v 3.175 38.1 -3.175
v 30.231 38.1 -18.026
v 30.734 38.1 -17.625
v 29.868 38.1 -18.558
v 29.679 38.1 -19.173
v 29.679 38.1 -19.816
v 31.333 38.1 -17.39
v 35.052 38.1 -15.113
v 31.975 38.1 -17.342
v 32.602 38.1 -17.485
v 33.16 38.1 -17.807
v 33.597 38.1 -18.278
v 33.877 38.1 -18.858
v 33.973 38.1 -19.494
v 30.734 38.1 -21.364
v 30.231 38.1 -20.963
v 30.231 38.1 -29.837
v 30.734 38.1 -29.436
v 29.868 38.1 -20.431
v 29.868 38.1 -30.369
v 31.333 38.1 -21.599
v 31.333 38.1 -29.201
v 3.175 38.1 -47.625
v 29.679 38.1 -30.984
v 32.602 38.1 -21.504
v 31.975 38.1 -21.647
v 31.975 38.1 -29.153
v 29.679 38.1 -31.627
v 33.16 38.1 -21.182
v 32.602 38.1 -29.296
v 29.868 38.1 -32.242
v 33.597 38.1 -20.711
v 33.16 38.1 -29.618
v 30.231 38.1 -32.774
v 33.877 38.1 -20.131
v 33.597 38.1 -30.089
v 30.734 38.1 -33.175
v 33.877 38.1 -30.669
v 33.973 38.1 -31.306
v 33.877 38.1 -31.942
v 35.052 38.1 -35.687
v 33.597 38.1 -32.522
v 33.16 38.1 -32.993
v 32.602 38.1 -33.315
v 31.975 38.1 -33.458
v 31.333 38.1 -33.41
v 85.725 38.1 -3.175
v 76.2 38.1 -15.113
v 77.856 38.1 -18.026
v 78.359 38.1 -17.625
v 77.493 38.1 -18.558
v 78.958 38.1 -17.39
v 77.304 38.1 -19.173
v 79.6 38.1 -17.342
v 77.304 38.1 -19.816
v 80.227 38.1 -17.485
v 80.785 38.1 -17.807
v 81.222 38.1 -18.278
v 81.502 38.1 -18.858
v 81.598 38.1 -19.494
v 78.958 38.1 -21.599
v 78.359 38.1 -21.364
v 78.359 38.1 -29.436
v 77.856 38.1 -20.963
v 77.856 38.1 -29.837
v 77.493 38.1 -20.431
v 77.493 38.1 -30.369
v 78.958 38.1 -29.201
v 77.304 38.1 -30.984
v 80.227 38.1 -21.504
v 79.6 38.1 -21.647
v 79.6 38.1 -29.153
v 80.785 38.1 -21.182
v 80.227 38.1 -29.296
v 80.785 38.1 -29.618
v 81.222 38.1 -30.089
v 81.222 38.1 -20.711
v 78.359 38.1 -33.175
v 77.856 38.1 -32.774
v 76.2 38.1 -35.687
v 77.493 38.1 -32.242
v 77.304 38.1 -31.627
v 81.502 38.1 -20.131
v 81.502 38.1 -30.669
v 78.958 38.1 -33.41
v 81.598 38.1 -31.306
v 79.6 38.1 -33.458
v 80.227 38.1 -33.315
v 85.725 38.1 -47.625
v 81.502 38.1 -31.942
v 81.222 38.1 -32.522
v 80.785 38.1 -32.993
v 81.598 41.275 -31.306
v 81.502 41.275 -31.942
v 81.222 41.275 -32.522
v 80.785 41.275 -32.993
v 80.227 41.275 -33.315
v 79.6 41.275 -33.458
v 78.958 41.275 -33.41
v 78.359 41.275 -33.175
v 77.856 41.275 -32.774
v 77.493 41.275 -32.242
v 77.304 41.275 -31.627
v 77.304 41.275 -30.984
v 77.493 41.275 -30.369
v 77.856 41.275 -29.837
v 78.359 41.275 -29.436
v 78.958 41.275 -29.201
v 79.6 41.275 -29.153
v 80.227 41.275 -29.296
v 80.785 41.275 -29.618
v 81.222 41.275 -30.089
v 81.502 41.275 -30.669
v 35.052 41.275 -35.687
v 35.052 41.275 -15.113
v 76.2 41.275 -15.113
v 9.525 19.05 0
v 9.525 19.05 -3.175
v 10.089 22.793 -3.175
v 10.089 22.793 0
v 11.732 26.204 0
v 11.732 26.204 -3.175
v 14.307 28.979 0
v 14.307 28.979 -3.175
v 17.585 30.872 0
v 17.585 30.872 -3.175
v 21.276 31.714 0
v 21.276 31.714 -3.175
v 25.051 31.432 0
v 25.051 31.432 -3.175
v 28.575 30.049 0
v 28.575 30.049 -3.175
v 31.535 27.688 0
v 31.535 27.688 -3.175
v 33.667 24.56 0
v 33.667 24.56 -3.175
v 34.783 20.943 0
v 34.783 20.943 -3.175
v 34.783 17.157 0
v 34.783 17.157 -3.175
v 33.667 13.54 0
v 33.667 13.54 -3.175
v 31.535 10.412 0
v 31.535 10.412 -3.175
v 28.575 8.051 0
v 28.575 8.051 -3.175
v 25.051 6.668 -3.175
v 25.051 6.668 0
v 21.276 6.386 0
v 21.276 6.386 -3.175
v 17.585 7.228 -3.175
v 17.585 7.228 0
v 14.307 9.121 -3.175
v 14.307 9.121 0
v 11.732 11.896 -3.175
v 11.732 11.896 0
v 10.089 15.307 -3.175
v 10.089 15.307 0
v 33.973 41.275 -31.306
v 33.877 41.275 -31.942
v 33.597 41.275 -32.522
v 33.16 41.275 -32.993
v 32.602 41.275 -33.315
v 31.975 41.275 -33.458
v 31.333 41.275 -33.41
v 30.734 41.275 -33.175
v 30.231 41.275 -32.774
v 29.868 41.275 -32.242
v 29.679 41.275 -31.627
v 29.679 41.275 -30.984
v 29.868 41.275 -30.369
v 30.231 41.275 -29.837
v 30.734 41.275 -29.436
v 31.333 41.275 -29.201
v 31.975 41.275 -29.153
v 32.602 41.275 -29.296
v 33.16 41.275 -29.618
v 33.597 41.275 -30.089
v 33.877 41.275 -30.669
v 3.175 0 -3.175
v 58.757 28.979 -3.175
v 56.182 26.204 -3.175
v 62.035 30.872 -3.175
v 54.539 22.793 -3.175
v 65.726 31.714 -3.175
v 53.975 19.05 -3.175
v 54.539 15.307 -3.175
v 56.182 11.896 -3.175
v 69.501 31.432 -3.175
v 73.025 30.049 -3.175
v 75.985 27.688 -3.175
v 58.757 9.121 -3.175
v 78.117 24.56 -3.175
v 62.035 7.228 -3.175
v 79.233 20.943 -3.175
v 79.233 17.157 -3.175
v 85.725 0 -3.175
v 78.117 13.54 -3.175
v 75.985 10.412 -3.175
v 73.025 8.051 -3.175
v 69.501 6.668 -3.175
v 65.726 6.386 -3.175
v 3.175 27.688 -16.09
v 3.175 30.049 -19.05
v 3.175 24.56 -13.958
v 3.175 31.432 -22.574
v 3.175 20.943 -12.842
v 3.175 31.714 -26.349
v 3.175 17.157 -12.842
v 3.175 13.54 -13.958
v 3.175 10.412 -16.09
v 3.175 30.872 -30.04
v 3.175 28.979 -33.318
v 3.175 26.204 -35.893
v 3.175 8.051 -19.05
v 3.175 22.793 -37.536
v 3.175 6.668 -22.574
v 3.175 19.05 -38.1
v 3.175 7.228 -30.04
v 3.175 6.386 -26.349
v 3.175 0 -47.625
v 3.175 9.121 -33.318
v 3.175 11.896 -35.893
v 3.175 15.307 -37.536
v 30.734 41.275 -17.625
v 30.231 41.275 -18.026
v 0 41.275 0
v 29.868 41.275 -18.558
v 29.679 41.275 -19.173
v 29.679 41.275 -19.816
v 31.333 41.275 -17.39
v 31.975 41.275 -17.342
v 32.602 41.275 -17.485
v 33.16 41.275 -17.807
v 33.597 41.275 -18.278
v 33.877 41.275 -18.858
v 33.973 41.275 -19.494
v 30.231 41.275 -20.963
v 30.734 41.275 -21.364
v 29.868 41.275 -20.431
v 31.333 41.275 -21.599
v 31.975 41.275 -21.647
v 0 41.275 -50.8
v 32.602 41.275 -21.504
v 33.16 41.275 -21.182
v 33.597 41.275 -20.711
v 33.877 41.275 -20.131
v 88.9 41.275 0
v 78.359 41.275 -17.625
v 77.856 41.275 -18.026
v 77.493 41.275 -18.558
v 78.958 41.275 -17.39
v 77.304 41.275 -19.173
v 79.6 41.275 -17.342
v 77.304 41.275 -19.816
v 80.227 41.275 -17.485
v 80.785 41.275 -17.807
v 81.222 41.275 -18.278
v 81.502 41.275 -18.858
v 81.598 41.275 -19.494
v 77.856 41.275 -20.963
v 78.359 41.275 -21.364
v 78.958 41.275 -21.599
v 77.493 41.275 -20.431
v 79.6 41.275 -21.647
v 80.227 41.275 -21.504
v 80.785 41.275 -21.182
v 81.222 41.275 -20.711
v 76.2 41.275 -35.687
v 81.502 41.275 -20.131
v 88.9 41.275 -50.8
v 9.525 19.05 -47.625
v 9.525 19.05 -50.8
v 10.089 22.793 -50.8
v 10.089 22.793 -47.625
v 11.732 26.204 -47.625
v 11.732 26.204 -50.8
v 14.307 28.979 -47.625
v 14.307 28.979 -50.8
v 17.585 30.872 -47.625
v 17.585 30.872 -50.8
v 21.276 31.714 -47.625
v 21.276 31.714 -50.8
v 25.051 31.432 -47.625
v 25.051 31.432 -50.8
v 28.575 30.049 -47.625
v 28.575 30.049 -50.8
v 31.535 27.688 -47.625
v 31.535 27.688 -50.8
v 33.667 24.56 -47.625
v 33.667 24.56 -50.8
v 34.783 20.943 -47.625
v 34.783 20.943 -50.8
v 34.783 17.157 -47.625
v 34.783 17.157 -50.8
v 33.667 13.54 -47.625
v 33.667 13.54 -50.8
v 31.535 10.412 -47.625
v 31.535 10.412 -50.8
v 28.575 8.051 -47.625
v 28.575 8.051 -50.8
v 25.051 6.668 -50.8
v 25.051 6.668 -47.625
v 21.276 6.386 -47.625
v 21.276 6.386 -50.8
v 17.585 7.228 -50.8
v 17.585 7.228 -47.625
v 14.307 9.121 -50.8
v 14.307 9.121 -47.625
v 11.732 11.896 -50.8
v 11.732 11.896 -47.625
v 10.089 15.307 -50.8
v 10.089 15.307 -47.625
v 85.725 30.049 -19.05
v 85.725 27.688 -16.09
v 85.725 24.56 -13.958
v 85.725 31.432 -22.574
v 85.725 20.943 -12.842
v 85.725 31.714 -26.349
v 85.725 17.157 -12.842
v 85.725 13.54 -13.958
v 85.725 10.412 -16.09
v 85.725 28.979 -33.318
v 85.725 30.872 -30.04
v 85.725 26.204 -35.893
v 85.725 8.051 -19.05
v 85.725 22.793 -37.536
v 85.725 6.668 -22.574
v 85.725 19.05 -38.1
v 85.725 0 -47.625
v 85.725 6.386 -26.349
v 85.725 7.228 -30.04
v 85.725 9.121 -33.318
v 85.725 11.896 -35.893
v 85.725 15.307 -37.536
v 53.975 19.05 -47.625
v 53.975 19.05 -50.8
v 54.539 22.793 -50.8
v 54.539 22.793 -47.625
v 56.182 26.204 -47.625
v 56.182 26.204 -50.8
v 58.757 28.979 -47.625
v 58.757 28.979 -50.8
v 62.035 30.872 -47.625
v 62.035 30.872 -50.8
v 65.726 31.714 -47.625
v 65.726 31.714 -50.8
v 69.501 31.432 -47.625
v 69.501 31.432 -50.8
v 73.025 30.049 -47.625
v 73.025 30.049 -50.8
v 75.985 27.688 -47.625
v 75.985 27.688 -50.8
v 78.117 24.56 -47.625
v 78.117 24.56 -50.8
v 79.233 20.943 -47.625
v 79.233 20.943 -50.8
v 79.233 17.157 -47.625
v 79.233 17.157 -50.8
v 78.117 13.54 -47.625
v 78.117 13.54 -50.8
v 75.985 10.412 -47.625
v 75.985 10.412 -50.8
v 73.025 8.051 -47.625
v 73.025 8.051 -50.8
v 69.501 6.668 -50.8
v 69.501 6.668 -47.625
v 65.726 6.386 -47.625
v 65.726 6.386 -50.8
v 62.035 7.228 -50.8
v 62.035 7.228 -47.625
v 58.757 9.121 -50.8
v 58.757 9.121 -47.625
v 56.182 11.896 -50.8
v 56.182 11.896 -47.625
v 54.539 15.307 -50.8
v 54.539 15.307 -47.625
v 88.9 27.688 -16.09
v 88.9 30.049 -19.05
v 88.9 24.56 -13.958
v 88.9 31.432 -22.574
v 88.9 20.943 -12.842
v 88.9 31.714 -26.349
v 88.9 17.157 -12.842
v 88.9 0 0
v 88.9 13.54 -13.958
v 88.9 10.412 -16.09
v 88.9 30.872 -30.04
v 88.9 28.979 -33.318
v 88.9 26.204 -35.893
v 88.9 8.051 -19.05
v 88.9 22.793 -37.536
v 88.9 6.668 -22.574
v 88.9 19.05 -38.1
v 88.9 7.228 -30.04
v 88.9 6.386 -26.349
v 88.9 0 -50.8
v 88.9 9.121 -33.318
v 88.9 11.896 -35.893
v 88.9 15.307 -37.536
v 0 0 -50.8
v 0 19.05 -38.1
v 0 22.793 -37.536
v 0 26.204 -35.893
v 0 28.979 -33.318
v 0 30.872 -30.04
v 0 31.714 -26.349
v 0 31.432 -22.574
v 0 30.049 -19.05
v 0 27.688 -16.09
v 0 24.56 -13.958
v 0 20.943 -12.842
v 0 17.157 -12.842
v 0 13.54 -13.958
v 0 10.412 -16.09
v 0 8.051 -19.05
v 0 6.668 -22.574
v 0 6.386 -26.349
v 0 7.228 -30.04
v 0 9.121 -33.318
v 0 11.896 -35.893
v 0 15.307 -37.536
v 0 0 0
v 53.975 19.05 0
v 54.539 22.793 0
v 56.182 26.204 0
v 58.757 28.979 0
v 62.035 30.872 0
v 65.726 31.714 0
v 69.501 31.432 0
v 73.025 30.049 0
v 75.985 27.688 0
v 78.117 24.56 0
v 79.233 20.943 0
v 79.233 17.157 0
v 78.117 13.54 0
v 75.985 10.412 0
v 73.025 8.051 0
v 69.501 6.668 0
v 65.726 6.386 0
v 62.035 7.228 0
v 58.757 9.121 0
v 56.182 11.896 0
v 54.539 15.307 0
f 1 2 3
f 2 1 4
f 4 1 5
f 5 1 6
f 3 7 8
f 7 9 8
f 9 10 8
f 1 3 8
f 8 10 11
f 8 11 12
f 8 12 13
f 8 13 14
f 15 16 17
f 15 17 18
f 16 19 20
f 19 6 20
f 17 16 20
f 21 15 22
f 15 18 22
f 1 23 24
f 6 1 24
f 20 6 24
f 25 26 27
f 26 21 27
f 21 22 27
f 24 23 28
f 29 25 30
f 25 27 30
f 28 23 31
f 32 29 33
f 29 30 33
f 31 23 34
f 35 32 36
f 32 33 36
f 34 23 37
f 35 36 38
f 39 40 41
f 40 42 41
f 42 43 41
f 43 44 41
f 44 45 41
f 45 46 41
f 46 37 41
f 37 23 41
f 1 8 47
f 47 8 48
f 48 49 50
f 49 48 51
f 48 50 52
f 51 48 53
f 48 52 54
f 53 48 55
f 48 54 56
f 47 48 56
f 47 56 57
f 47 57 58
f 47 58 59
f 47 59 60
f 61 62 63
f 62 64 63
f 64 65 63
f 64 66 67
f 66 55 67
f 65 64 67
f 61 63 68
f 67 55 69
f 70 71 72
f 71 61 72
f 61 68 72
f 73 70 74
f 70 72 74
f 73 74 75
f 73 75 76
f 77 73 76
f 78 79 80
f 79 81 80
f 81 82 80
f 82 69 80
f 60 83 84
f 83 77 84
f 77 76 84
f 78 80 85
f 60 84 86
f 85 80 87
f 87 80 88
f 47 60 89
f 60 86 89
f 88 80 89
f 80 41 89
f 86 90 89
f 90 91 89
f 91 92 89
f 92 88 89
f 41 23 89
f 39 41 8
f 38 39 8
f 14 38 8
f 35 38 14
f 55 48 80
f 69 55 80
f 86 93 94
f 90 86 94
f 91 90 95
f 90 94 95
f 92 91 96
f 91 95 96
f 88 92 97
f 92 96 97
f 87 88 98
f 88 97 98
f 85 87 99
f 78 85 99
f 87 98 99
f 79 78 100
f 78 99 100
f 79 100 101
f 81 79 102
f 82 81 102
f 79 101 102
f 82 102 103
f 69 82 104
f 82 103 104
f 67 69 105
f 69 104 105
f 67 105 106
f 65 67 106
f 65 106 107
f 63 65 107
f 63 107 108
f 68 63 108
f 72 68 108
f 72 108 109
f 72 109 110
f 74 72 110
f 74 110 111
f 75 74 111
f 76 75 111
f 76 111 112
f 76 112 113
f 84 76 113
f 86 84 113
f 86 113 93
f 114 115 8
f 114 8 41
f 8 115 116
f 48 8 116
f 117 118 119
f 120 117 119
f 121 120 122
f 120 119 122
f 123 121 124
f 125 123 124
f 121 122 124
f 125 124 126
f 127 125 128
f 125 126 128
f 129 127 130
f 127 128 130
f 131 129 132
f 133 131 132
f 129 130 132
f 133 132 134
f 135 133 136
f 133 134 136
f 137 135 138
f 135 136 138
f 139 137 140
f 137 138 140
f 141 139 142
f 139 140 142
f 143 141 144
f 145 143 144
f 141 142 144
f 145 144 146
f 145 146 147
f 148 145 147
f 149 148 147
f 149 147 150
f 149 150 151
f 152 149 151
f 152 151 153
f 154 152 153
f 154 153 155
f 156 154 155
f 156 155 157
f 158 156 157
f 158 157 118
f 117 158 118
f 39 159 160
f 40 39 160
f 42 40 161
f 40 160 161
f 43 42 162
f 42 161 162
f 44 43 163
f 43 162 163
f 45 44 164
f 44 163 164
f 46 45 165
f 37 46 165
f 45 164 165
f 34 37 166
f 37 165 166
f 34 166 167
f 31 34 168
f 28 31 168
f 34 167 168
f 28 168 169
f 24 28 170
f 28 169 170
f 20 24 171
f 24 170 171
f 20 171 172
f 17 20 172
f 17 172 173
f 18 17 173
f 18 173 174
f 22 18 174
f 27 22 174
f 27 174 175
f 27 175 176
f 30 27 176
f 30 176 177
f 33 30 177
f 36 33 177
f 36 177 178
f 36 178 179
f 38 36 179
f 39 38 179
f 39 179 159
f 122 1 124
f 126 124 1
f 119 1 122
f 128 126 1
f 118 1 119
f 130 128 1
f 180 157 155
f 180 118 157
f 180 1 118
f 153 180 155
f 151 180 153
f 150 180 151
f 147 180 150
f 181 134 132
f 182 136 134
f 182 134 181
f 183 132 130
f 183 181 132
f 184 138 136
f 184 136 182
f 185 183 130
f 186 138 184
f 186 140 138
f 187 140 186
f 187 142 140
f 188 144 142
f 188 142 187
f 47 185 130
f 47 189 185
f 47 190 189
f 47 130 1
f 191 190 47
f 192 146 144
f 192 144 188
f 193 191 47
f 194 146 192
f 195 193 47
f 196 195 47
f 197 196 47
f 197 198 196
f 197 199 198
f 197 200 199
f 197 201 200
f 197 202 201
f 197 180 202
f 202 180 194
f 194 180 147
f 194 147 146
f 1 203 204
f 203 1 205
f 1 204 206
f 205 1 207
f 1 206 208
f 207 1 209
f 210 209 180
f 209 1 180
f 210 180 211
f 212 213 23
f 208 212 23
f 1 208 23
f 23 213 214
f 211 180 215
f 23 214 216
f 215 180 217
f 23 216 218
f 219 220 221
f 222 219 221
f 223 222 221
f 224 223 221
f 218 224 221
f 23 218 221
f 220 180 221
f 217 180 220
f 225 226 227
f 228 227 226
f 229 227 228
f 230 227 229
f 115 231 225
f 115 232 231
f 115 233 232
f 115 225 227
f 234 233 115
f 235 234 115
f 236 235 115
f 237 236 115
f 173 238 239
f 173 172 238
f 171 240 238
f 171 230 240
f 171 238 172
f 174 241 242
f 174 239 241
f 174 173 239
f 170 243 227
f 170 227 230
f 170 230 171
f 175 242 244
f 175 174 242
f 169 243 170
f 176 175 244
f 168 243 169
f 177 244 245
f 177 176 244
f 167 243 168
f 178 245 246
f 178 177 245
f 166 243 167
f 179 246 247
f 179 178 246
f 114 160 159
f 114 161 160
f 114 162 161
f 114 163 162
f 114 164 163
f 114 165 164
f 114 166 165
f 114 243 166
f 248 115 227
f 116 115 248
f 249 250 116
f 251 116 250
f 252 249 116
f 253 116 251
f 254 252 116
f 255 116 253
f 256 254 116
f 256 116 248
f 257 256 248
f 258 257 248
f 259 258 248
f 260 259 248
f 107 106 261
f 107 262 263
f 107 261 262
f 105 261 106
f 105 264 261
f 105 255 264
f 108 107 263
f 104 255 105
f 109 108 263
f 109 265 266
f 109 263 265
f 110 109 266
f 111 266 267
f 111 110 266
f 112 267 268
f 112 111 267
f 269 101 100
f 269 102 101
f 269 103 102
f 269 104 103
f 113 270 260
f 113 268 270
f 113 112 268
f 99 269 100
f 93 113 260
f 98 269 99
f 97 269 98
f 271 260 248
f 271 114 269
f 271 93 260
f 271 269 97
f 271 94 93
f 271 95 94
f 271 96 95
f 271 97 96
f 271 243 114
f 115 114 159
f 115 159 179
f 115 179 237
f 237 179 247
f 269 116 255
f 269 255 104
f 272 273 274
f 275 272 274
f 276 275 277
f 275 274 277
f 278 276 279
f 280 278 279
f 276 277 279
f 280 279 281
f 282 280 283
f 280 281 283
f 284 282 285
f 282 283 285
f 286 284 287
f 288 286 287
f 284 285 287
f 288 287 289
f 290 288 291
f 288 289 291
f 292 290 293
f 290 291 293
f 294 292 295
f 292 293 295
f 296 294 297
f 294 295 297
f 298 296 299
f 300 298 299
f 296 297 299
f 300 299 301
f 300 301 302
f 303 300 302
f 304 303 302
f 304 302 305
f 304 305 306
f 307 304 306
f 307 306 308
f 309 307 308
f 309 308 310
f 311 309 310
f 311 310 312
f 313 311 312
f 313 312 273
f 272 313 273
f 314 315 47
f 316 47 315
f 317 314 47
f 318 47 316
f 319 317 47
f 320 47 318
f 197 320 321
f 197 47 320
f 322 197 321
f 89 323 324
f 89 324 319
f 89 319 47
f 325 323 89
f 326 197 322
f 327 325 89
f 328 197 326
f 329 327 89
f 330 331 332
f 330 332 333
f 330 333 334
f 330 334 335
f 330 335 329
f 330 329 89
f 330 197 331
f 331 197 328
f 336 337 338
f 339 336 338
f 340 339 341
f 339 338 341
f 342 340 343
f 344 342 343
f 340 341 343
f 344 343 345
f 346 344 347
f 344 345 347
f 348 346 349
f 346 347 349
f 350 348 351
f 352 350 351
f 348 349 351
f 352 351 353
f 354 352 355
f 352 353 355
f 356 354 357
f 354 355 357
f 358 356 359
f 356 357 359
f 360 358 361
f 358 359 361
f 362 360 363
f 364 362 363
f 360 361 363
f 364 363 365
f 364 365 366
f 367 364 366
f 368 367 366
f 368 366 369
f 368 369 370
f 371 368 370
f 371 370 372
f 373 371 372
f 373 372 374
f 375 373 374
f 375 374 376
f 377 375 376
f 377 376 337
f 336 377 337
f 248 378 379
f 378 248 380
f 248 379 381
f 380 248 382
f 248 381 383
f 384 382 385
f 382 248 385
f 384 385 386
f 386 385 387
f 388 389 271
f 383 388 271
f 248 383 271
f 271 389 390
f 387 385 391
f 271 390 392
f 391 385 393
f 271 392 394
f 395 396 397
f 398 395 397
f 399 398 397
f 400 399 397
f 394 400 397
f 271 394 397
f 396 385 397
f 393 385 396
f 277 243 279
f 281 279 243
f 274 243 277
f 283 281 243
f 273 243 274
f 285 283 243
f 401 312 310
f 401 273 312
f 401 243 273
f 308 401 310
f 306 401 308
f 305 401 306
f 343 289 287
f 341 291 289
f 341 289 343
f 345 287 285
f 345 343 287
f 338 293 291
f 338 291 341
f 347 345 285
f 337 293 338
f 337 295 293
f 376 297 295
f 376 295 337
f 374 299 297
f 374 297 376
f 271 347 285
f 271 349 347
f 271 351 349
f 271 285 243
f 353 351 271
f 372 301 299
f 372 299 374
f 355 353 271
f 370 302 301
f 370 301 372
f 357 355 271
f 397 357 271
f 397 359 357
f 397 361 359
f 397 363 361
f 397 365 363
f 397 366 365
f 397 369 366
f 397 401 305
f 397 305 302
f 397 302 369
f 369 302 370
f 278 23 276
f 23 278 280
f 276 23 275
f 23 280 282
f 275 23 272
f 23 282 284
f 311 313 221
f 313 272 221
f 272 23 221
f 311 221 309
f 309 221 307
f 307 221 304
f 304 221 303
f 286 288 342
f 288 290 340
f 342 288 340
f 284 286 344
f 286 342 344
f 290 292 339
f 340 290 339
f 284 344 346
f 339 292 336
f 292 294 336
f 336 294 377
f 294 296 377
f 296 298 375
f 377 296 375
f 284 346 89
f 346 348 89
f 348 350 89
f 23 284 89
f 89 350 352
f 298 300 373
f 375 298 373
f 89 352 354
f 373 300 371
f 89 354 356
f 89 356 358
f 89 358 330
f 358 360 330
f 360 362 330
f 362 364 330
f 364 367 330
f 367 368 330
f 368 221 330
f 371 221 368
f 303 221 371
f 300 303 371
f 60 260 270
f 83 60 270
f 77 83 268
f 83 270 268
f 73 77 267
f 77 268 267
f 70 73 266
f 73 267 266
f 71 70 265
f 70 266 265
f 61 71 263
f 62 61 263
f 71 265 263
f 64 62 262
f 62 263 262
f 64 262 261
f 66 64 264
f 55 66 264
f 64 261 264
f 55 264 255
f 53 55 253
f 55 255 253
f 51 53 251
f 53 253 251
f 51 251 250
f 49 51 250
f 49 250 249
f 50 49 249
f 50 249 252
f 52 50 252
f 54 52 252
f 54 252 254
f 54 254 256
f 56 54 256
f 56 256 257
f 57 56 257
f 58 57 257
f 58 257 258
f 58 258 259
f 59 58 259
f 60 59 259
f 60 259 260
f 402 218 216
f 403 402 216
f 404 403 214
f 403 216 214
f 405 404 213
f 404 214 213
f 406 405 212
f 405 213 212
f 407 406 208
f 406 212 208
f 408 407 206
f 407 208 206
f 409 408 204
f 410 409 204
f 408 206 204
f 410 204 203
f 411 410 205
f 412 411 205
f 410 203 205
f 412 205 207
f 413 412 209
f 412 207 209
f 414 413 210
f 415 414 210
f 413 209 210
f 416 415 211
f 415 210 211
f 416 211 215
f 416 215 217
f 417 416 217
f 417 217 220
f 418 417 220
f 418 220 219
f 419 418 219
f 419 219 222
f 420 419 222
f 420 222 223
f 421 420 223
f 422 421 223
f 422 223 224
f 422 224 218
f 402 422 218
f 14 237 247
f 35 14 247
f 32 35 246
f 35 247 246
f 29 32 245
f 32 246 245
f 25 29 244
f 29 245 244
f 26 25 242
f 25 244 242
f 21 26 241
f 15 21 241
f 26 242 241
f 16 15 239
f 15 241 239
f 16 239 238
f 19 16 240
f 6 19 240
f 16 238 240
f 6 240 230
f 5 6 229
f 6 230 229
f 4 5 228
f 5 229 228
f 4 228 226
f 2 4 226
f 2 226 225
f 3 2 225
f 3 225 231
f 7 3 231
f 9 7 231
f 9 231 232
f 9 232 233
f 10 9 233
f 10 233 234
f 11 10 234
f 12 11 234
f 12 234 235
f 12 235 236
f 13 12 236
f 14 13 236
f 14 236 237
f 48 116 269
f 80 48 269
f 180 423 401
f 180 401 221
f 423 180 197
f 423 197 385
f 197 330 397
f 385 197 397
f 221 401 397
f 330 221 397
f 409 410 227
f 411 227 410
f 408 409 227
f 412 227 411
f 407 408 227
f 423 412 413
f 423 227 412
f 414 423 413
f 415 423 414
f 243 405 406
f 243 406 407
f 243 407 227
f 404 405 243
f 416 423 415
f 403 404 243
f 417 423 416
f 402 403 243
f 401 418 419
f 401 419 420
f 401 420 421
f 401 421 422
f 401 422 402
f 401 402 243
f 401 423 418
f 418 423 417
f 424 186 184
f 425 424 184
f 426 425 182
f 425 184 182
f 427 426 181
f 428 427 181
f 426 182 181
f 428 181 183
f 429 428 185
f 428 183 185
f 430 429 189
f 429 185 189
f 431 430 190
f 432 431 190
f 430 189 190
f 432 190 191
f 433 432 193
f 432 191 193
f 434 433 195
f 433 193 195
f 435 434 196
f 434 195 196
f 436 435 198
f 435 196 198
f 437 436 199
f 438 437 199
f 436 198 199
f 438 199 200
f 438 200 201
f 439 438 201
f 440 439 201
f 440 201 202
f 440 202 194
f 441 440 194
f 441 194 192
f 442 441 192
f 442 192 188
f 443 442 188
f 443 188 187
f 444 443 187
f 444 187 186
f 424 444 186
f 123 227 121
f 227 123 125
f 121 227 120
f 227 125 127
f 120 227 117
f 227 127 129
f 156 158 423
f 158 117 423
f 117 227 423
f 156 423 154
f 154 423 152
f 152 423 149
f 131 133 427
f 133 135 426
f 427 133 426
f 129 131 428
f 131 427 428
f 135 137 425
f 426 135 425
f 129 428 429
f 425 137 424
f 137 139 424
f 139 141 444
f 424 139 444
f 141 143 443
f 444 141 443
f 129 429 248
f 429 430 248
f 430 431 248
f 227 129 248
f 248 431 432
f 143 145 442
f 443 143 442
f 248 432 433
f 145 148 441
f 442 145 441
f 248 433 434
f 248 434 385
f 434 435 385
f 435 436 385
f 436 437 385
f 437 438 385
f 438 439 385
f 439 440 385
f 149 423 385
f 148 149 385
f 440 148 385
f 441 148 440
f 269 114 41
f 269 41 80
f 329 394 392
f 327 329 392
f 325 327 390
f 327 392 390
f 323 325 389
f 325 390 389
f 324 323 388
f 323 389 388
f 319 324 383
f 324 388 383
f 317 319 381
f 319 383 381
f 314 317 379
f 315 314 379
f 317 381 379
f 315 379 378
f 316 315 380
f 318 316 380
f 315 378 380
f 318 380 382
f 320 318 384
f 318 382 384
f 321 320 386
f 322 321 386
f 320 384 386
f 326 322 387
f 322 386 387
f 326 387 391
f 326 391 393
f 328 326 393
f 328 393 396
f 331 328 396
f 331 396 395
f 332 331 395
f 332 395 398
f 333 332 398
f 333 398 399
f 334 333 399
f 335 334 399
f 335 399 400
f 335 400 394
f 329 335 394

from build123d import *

# Parameters (mm, degrees)
SKETCH3_W           = 88.9
SKETCH3_H           = 50.8
SKETCH3_W_2         = 82.55
SKETCH3_H_2         = 44.45
BOSS_EXTRUDE2_DEPTH = 38.1
SKETCH4_R           = 12.7
CUT_EXTRUDE1_DEPTH  = 88.9
SKETCH6_W           = 88.9
SKETCH6_H           = 50.8
BOSS_EXTRUDE3_DEPTH = 3.175
SKETCH7_R           = 12.7
CUT_EXTRUDE2_DEPTH  = 50.8
CUT_EXTRUDE3_REACH  = 43.275
SKETCH8_R           = 2.159
SKETCH8_W           = 41.148
SKETCH8_H           = 20.574


with BuildPart() as part:
    # Sketch3 → Boss-Extrude2 (new body)
    with BuildSketch(Plane(origin=(0, 0, 0), x_dir=(1, 0, 0), z_dir=(0, 1, 0))):
        with Locations((44.45, 25.4)):
            Rectangle(SKETCH3_W, SKETCH3_H)
        with Locations((44.45, 25.4)):
            Rectangle(SKETCH3_W_2, SKETCH3_H_2, mode=Mode.SUBTRACT)
    extrude(amount=BOSS_EXTRUDE2_DEPTH)

    # Sketch4 → Cut-Extrude1 (cut)
    with BuildSketch(Plane(origin=(88.9, 0, 0), x_dir=(0, 0, -1), z_dir=(1, 0, 0))):
        with Locations((25.4, 19.05)):
            Circle(SKETCH4_R)
    extrude(amount=-CUT_EXTRUDE1_DEPTH, mode=Mode.SUBTRACT)

    # Sketch6 → Boss-Extrude3 (add)
    with BuildSketch(Plane(origin=(0, 38.1, 0), x_dir=(1, 0, 0), z_dir=(0, 1, 0))):
        with Locations((44.45, 25.4)):
            Rectangle(SKETCH6_W, SKETCH6_H)
    extrude(amount=BOSS_EXTRUDE3_DEPTH)

    # Sketch7 → Cut-Extrude2 (cut)
    with BuildSketch(Plane(origin=(0, 0, -50.8), x_dir=(-1, 0, 0), z_dir=(0, 0, -1))):
        with Locations((-66.675, 19.05)):
            Circle(SKETCH7_R)
        with Locations((-22.225, 19.05)):
            Circle(SKETCH7_R)
    extrude(amount=-CUT_EXTRUDE2_DEPTH, mode=Mode.SUBTRACT)

    # Sketch8 → Cut-Extrude3 (cut, up to next)
    with BuildSketch(Plane(origin=(0, 41.275, 0), x_dir=(1, 0, 0), z_dir=(0, 1, 0)), mode=Mode.PRIVATE) as cut_extrude3_sk1:
        with Locations((31.8135, 31.3055)):
            Circle(SKETCH8_R)
    cut_extrude3_tool1 = extrude(cut_extrude3_sk1.sketch, amount=-CUT_EXTRUDE3_REACH, mode=Mode.PRIVATE) & part.part
    add(cut_extrude3_tool1.solids().sort_by_distance((31.8135, 41.275, -31.3055))[0], mode=Mode.SUBTRACT)
    # Sketch8 → Cut-Extrude3 (cut, up to next)
    with BuildSketch(Plane(origin=(0, 41.275, 0), x_dir=(1, 0, 0), z_dir=(0, 1, 0)), mode=Mode.PRIVATE) as cut_extrude3_sk2:
        with Locations((31.8135, 19.4945)):
            Circle(SKETCH8_R)
    cut_extrude3_tool2 = extrude(cut_extrude3_sk2.sketch, amount=-CUT_EXTRUDE3_REACH, mode=Mode.PRIVATE) & part.part
    add(cut_extrude3_tool2.solids().sort_by_distance((31.8135, 41.275, -19.4945))[0], mode=Mode.SUBTRACT)
    # Sketch8 → Cut-Extrude3 (cut, up to next)
    with BuildSketch(Plane(origin=(0, 41.275, 0), x_dir=(1, 0, 0), z_dir=(0, 1, 0)), mode=Mode.PRIVATE) as cut_extrude3_sk3:
        with Locations((79.4385, 19.4945)):
            Circle(SKETCH8_R)
    cut_extrude3_tool3 = extrude(cut_extrude3_sk3.sketch, amount=-CUT_EXTRUDE3_REACH, mode=Mode.PRIVATE) & part.part
    add(cut_extrude3_tool3.solids().sort_by_distance((79.4385, 41.275, -19.4945))[0], mode=Mode.SUBTRACT)
    # Sketch8 → Cut-Extrude3 (cut, up to next)
    with BuildSketch(Plane(origin=(0, 41.275, 0), x_dir=(1, 0, 0), z_dir=(0, 1, 0)), mode=Mode.PRIVATE) as cut_extrude3_sk4:
        with Locations((79.4385, 31.3055)):
            Circle(SKETCH8_R)
    cut_extrude3_tool4 = extrude(cut_extrude3_sk4.sketch, amount=-CUT_EXTRUDE3_REACH, mode=Mode.PRIVATE) & part.part
    add(cut_extrude3_tool4.solids().sort_by_distance((79.4385, 41.275, -31.3055))[0], mode=Mode.SUBTRACT)
    # Sketch8 → Cut-Extrude3 (cut, up to next)
    with BuildSketch(Plane(origin=(0, 41.275, 0), x_dir=(1, 0, 0), z_dir=(0, 1, 0)), mode=Mode.PRIVATE) as cut_extrude3_sk5:
        with Locations((55.626, 25.4)):
            Rectangle(SKETCH8_W, SKETCH8_H)
    cut_extrude3_tool5 = extrude(cut_extrude3_sk5.sketch, amount=-CUT_EXTRUDE3_REACH, mode=Mode.PRIVATE) & part.part
    add(cut_extrude3_tool5.solids().sort_by_distance((55.626, 41.275, -25.4))[0], mode=Mode.SUBTRACT)


solid = part.part
